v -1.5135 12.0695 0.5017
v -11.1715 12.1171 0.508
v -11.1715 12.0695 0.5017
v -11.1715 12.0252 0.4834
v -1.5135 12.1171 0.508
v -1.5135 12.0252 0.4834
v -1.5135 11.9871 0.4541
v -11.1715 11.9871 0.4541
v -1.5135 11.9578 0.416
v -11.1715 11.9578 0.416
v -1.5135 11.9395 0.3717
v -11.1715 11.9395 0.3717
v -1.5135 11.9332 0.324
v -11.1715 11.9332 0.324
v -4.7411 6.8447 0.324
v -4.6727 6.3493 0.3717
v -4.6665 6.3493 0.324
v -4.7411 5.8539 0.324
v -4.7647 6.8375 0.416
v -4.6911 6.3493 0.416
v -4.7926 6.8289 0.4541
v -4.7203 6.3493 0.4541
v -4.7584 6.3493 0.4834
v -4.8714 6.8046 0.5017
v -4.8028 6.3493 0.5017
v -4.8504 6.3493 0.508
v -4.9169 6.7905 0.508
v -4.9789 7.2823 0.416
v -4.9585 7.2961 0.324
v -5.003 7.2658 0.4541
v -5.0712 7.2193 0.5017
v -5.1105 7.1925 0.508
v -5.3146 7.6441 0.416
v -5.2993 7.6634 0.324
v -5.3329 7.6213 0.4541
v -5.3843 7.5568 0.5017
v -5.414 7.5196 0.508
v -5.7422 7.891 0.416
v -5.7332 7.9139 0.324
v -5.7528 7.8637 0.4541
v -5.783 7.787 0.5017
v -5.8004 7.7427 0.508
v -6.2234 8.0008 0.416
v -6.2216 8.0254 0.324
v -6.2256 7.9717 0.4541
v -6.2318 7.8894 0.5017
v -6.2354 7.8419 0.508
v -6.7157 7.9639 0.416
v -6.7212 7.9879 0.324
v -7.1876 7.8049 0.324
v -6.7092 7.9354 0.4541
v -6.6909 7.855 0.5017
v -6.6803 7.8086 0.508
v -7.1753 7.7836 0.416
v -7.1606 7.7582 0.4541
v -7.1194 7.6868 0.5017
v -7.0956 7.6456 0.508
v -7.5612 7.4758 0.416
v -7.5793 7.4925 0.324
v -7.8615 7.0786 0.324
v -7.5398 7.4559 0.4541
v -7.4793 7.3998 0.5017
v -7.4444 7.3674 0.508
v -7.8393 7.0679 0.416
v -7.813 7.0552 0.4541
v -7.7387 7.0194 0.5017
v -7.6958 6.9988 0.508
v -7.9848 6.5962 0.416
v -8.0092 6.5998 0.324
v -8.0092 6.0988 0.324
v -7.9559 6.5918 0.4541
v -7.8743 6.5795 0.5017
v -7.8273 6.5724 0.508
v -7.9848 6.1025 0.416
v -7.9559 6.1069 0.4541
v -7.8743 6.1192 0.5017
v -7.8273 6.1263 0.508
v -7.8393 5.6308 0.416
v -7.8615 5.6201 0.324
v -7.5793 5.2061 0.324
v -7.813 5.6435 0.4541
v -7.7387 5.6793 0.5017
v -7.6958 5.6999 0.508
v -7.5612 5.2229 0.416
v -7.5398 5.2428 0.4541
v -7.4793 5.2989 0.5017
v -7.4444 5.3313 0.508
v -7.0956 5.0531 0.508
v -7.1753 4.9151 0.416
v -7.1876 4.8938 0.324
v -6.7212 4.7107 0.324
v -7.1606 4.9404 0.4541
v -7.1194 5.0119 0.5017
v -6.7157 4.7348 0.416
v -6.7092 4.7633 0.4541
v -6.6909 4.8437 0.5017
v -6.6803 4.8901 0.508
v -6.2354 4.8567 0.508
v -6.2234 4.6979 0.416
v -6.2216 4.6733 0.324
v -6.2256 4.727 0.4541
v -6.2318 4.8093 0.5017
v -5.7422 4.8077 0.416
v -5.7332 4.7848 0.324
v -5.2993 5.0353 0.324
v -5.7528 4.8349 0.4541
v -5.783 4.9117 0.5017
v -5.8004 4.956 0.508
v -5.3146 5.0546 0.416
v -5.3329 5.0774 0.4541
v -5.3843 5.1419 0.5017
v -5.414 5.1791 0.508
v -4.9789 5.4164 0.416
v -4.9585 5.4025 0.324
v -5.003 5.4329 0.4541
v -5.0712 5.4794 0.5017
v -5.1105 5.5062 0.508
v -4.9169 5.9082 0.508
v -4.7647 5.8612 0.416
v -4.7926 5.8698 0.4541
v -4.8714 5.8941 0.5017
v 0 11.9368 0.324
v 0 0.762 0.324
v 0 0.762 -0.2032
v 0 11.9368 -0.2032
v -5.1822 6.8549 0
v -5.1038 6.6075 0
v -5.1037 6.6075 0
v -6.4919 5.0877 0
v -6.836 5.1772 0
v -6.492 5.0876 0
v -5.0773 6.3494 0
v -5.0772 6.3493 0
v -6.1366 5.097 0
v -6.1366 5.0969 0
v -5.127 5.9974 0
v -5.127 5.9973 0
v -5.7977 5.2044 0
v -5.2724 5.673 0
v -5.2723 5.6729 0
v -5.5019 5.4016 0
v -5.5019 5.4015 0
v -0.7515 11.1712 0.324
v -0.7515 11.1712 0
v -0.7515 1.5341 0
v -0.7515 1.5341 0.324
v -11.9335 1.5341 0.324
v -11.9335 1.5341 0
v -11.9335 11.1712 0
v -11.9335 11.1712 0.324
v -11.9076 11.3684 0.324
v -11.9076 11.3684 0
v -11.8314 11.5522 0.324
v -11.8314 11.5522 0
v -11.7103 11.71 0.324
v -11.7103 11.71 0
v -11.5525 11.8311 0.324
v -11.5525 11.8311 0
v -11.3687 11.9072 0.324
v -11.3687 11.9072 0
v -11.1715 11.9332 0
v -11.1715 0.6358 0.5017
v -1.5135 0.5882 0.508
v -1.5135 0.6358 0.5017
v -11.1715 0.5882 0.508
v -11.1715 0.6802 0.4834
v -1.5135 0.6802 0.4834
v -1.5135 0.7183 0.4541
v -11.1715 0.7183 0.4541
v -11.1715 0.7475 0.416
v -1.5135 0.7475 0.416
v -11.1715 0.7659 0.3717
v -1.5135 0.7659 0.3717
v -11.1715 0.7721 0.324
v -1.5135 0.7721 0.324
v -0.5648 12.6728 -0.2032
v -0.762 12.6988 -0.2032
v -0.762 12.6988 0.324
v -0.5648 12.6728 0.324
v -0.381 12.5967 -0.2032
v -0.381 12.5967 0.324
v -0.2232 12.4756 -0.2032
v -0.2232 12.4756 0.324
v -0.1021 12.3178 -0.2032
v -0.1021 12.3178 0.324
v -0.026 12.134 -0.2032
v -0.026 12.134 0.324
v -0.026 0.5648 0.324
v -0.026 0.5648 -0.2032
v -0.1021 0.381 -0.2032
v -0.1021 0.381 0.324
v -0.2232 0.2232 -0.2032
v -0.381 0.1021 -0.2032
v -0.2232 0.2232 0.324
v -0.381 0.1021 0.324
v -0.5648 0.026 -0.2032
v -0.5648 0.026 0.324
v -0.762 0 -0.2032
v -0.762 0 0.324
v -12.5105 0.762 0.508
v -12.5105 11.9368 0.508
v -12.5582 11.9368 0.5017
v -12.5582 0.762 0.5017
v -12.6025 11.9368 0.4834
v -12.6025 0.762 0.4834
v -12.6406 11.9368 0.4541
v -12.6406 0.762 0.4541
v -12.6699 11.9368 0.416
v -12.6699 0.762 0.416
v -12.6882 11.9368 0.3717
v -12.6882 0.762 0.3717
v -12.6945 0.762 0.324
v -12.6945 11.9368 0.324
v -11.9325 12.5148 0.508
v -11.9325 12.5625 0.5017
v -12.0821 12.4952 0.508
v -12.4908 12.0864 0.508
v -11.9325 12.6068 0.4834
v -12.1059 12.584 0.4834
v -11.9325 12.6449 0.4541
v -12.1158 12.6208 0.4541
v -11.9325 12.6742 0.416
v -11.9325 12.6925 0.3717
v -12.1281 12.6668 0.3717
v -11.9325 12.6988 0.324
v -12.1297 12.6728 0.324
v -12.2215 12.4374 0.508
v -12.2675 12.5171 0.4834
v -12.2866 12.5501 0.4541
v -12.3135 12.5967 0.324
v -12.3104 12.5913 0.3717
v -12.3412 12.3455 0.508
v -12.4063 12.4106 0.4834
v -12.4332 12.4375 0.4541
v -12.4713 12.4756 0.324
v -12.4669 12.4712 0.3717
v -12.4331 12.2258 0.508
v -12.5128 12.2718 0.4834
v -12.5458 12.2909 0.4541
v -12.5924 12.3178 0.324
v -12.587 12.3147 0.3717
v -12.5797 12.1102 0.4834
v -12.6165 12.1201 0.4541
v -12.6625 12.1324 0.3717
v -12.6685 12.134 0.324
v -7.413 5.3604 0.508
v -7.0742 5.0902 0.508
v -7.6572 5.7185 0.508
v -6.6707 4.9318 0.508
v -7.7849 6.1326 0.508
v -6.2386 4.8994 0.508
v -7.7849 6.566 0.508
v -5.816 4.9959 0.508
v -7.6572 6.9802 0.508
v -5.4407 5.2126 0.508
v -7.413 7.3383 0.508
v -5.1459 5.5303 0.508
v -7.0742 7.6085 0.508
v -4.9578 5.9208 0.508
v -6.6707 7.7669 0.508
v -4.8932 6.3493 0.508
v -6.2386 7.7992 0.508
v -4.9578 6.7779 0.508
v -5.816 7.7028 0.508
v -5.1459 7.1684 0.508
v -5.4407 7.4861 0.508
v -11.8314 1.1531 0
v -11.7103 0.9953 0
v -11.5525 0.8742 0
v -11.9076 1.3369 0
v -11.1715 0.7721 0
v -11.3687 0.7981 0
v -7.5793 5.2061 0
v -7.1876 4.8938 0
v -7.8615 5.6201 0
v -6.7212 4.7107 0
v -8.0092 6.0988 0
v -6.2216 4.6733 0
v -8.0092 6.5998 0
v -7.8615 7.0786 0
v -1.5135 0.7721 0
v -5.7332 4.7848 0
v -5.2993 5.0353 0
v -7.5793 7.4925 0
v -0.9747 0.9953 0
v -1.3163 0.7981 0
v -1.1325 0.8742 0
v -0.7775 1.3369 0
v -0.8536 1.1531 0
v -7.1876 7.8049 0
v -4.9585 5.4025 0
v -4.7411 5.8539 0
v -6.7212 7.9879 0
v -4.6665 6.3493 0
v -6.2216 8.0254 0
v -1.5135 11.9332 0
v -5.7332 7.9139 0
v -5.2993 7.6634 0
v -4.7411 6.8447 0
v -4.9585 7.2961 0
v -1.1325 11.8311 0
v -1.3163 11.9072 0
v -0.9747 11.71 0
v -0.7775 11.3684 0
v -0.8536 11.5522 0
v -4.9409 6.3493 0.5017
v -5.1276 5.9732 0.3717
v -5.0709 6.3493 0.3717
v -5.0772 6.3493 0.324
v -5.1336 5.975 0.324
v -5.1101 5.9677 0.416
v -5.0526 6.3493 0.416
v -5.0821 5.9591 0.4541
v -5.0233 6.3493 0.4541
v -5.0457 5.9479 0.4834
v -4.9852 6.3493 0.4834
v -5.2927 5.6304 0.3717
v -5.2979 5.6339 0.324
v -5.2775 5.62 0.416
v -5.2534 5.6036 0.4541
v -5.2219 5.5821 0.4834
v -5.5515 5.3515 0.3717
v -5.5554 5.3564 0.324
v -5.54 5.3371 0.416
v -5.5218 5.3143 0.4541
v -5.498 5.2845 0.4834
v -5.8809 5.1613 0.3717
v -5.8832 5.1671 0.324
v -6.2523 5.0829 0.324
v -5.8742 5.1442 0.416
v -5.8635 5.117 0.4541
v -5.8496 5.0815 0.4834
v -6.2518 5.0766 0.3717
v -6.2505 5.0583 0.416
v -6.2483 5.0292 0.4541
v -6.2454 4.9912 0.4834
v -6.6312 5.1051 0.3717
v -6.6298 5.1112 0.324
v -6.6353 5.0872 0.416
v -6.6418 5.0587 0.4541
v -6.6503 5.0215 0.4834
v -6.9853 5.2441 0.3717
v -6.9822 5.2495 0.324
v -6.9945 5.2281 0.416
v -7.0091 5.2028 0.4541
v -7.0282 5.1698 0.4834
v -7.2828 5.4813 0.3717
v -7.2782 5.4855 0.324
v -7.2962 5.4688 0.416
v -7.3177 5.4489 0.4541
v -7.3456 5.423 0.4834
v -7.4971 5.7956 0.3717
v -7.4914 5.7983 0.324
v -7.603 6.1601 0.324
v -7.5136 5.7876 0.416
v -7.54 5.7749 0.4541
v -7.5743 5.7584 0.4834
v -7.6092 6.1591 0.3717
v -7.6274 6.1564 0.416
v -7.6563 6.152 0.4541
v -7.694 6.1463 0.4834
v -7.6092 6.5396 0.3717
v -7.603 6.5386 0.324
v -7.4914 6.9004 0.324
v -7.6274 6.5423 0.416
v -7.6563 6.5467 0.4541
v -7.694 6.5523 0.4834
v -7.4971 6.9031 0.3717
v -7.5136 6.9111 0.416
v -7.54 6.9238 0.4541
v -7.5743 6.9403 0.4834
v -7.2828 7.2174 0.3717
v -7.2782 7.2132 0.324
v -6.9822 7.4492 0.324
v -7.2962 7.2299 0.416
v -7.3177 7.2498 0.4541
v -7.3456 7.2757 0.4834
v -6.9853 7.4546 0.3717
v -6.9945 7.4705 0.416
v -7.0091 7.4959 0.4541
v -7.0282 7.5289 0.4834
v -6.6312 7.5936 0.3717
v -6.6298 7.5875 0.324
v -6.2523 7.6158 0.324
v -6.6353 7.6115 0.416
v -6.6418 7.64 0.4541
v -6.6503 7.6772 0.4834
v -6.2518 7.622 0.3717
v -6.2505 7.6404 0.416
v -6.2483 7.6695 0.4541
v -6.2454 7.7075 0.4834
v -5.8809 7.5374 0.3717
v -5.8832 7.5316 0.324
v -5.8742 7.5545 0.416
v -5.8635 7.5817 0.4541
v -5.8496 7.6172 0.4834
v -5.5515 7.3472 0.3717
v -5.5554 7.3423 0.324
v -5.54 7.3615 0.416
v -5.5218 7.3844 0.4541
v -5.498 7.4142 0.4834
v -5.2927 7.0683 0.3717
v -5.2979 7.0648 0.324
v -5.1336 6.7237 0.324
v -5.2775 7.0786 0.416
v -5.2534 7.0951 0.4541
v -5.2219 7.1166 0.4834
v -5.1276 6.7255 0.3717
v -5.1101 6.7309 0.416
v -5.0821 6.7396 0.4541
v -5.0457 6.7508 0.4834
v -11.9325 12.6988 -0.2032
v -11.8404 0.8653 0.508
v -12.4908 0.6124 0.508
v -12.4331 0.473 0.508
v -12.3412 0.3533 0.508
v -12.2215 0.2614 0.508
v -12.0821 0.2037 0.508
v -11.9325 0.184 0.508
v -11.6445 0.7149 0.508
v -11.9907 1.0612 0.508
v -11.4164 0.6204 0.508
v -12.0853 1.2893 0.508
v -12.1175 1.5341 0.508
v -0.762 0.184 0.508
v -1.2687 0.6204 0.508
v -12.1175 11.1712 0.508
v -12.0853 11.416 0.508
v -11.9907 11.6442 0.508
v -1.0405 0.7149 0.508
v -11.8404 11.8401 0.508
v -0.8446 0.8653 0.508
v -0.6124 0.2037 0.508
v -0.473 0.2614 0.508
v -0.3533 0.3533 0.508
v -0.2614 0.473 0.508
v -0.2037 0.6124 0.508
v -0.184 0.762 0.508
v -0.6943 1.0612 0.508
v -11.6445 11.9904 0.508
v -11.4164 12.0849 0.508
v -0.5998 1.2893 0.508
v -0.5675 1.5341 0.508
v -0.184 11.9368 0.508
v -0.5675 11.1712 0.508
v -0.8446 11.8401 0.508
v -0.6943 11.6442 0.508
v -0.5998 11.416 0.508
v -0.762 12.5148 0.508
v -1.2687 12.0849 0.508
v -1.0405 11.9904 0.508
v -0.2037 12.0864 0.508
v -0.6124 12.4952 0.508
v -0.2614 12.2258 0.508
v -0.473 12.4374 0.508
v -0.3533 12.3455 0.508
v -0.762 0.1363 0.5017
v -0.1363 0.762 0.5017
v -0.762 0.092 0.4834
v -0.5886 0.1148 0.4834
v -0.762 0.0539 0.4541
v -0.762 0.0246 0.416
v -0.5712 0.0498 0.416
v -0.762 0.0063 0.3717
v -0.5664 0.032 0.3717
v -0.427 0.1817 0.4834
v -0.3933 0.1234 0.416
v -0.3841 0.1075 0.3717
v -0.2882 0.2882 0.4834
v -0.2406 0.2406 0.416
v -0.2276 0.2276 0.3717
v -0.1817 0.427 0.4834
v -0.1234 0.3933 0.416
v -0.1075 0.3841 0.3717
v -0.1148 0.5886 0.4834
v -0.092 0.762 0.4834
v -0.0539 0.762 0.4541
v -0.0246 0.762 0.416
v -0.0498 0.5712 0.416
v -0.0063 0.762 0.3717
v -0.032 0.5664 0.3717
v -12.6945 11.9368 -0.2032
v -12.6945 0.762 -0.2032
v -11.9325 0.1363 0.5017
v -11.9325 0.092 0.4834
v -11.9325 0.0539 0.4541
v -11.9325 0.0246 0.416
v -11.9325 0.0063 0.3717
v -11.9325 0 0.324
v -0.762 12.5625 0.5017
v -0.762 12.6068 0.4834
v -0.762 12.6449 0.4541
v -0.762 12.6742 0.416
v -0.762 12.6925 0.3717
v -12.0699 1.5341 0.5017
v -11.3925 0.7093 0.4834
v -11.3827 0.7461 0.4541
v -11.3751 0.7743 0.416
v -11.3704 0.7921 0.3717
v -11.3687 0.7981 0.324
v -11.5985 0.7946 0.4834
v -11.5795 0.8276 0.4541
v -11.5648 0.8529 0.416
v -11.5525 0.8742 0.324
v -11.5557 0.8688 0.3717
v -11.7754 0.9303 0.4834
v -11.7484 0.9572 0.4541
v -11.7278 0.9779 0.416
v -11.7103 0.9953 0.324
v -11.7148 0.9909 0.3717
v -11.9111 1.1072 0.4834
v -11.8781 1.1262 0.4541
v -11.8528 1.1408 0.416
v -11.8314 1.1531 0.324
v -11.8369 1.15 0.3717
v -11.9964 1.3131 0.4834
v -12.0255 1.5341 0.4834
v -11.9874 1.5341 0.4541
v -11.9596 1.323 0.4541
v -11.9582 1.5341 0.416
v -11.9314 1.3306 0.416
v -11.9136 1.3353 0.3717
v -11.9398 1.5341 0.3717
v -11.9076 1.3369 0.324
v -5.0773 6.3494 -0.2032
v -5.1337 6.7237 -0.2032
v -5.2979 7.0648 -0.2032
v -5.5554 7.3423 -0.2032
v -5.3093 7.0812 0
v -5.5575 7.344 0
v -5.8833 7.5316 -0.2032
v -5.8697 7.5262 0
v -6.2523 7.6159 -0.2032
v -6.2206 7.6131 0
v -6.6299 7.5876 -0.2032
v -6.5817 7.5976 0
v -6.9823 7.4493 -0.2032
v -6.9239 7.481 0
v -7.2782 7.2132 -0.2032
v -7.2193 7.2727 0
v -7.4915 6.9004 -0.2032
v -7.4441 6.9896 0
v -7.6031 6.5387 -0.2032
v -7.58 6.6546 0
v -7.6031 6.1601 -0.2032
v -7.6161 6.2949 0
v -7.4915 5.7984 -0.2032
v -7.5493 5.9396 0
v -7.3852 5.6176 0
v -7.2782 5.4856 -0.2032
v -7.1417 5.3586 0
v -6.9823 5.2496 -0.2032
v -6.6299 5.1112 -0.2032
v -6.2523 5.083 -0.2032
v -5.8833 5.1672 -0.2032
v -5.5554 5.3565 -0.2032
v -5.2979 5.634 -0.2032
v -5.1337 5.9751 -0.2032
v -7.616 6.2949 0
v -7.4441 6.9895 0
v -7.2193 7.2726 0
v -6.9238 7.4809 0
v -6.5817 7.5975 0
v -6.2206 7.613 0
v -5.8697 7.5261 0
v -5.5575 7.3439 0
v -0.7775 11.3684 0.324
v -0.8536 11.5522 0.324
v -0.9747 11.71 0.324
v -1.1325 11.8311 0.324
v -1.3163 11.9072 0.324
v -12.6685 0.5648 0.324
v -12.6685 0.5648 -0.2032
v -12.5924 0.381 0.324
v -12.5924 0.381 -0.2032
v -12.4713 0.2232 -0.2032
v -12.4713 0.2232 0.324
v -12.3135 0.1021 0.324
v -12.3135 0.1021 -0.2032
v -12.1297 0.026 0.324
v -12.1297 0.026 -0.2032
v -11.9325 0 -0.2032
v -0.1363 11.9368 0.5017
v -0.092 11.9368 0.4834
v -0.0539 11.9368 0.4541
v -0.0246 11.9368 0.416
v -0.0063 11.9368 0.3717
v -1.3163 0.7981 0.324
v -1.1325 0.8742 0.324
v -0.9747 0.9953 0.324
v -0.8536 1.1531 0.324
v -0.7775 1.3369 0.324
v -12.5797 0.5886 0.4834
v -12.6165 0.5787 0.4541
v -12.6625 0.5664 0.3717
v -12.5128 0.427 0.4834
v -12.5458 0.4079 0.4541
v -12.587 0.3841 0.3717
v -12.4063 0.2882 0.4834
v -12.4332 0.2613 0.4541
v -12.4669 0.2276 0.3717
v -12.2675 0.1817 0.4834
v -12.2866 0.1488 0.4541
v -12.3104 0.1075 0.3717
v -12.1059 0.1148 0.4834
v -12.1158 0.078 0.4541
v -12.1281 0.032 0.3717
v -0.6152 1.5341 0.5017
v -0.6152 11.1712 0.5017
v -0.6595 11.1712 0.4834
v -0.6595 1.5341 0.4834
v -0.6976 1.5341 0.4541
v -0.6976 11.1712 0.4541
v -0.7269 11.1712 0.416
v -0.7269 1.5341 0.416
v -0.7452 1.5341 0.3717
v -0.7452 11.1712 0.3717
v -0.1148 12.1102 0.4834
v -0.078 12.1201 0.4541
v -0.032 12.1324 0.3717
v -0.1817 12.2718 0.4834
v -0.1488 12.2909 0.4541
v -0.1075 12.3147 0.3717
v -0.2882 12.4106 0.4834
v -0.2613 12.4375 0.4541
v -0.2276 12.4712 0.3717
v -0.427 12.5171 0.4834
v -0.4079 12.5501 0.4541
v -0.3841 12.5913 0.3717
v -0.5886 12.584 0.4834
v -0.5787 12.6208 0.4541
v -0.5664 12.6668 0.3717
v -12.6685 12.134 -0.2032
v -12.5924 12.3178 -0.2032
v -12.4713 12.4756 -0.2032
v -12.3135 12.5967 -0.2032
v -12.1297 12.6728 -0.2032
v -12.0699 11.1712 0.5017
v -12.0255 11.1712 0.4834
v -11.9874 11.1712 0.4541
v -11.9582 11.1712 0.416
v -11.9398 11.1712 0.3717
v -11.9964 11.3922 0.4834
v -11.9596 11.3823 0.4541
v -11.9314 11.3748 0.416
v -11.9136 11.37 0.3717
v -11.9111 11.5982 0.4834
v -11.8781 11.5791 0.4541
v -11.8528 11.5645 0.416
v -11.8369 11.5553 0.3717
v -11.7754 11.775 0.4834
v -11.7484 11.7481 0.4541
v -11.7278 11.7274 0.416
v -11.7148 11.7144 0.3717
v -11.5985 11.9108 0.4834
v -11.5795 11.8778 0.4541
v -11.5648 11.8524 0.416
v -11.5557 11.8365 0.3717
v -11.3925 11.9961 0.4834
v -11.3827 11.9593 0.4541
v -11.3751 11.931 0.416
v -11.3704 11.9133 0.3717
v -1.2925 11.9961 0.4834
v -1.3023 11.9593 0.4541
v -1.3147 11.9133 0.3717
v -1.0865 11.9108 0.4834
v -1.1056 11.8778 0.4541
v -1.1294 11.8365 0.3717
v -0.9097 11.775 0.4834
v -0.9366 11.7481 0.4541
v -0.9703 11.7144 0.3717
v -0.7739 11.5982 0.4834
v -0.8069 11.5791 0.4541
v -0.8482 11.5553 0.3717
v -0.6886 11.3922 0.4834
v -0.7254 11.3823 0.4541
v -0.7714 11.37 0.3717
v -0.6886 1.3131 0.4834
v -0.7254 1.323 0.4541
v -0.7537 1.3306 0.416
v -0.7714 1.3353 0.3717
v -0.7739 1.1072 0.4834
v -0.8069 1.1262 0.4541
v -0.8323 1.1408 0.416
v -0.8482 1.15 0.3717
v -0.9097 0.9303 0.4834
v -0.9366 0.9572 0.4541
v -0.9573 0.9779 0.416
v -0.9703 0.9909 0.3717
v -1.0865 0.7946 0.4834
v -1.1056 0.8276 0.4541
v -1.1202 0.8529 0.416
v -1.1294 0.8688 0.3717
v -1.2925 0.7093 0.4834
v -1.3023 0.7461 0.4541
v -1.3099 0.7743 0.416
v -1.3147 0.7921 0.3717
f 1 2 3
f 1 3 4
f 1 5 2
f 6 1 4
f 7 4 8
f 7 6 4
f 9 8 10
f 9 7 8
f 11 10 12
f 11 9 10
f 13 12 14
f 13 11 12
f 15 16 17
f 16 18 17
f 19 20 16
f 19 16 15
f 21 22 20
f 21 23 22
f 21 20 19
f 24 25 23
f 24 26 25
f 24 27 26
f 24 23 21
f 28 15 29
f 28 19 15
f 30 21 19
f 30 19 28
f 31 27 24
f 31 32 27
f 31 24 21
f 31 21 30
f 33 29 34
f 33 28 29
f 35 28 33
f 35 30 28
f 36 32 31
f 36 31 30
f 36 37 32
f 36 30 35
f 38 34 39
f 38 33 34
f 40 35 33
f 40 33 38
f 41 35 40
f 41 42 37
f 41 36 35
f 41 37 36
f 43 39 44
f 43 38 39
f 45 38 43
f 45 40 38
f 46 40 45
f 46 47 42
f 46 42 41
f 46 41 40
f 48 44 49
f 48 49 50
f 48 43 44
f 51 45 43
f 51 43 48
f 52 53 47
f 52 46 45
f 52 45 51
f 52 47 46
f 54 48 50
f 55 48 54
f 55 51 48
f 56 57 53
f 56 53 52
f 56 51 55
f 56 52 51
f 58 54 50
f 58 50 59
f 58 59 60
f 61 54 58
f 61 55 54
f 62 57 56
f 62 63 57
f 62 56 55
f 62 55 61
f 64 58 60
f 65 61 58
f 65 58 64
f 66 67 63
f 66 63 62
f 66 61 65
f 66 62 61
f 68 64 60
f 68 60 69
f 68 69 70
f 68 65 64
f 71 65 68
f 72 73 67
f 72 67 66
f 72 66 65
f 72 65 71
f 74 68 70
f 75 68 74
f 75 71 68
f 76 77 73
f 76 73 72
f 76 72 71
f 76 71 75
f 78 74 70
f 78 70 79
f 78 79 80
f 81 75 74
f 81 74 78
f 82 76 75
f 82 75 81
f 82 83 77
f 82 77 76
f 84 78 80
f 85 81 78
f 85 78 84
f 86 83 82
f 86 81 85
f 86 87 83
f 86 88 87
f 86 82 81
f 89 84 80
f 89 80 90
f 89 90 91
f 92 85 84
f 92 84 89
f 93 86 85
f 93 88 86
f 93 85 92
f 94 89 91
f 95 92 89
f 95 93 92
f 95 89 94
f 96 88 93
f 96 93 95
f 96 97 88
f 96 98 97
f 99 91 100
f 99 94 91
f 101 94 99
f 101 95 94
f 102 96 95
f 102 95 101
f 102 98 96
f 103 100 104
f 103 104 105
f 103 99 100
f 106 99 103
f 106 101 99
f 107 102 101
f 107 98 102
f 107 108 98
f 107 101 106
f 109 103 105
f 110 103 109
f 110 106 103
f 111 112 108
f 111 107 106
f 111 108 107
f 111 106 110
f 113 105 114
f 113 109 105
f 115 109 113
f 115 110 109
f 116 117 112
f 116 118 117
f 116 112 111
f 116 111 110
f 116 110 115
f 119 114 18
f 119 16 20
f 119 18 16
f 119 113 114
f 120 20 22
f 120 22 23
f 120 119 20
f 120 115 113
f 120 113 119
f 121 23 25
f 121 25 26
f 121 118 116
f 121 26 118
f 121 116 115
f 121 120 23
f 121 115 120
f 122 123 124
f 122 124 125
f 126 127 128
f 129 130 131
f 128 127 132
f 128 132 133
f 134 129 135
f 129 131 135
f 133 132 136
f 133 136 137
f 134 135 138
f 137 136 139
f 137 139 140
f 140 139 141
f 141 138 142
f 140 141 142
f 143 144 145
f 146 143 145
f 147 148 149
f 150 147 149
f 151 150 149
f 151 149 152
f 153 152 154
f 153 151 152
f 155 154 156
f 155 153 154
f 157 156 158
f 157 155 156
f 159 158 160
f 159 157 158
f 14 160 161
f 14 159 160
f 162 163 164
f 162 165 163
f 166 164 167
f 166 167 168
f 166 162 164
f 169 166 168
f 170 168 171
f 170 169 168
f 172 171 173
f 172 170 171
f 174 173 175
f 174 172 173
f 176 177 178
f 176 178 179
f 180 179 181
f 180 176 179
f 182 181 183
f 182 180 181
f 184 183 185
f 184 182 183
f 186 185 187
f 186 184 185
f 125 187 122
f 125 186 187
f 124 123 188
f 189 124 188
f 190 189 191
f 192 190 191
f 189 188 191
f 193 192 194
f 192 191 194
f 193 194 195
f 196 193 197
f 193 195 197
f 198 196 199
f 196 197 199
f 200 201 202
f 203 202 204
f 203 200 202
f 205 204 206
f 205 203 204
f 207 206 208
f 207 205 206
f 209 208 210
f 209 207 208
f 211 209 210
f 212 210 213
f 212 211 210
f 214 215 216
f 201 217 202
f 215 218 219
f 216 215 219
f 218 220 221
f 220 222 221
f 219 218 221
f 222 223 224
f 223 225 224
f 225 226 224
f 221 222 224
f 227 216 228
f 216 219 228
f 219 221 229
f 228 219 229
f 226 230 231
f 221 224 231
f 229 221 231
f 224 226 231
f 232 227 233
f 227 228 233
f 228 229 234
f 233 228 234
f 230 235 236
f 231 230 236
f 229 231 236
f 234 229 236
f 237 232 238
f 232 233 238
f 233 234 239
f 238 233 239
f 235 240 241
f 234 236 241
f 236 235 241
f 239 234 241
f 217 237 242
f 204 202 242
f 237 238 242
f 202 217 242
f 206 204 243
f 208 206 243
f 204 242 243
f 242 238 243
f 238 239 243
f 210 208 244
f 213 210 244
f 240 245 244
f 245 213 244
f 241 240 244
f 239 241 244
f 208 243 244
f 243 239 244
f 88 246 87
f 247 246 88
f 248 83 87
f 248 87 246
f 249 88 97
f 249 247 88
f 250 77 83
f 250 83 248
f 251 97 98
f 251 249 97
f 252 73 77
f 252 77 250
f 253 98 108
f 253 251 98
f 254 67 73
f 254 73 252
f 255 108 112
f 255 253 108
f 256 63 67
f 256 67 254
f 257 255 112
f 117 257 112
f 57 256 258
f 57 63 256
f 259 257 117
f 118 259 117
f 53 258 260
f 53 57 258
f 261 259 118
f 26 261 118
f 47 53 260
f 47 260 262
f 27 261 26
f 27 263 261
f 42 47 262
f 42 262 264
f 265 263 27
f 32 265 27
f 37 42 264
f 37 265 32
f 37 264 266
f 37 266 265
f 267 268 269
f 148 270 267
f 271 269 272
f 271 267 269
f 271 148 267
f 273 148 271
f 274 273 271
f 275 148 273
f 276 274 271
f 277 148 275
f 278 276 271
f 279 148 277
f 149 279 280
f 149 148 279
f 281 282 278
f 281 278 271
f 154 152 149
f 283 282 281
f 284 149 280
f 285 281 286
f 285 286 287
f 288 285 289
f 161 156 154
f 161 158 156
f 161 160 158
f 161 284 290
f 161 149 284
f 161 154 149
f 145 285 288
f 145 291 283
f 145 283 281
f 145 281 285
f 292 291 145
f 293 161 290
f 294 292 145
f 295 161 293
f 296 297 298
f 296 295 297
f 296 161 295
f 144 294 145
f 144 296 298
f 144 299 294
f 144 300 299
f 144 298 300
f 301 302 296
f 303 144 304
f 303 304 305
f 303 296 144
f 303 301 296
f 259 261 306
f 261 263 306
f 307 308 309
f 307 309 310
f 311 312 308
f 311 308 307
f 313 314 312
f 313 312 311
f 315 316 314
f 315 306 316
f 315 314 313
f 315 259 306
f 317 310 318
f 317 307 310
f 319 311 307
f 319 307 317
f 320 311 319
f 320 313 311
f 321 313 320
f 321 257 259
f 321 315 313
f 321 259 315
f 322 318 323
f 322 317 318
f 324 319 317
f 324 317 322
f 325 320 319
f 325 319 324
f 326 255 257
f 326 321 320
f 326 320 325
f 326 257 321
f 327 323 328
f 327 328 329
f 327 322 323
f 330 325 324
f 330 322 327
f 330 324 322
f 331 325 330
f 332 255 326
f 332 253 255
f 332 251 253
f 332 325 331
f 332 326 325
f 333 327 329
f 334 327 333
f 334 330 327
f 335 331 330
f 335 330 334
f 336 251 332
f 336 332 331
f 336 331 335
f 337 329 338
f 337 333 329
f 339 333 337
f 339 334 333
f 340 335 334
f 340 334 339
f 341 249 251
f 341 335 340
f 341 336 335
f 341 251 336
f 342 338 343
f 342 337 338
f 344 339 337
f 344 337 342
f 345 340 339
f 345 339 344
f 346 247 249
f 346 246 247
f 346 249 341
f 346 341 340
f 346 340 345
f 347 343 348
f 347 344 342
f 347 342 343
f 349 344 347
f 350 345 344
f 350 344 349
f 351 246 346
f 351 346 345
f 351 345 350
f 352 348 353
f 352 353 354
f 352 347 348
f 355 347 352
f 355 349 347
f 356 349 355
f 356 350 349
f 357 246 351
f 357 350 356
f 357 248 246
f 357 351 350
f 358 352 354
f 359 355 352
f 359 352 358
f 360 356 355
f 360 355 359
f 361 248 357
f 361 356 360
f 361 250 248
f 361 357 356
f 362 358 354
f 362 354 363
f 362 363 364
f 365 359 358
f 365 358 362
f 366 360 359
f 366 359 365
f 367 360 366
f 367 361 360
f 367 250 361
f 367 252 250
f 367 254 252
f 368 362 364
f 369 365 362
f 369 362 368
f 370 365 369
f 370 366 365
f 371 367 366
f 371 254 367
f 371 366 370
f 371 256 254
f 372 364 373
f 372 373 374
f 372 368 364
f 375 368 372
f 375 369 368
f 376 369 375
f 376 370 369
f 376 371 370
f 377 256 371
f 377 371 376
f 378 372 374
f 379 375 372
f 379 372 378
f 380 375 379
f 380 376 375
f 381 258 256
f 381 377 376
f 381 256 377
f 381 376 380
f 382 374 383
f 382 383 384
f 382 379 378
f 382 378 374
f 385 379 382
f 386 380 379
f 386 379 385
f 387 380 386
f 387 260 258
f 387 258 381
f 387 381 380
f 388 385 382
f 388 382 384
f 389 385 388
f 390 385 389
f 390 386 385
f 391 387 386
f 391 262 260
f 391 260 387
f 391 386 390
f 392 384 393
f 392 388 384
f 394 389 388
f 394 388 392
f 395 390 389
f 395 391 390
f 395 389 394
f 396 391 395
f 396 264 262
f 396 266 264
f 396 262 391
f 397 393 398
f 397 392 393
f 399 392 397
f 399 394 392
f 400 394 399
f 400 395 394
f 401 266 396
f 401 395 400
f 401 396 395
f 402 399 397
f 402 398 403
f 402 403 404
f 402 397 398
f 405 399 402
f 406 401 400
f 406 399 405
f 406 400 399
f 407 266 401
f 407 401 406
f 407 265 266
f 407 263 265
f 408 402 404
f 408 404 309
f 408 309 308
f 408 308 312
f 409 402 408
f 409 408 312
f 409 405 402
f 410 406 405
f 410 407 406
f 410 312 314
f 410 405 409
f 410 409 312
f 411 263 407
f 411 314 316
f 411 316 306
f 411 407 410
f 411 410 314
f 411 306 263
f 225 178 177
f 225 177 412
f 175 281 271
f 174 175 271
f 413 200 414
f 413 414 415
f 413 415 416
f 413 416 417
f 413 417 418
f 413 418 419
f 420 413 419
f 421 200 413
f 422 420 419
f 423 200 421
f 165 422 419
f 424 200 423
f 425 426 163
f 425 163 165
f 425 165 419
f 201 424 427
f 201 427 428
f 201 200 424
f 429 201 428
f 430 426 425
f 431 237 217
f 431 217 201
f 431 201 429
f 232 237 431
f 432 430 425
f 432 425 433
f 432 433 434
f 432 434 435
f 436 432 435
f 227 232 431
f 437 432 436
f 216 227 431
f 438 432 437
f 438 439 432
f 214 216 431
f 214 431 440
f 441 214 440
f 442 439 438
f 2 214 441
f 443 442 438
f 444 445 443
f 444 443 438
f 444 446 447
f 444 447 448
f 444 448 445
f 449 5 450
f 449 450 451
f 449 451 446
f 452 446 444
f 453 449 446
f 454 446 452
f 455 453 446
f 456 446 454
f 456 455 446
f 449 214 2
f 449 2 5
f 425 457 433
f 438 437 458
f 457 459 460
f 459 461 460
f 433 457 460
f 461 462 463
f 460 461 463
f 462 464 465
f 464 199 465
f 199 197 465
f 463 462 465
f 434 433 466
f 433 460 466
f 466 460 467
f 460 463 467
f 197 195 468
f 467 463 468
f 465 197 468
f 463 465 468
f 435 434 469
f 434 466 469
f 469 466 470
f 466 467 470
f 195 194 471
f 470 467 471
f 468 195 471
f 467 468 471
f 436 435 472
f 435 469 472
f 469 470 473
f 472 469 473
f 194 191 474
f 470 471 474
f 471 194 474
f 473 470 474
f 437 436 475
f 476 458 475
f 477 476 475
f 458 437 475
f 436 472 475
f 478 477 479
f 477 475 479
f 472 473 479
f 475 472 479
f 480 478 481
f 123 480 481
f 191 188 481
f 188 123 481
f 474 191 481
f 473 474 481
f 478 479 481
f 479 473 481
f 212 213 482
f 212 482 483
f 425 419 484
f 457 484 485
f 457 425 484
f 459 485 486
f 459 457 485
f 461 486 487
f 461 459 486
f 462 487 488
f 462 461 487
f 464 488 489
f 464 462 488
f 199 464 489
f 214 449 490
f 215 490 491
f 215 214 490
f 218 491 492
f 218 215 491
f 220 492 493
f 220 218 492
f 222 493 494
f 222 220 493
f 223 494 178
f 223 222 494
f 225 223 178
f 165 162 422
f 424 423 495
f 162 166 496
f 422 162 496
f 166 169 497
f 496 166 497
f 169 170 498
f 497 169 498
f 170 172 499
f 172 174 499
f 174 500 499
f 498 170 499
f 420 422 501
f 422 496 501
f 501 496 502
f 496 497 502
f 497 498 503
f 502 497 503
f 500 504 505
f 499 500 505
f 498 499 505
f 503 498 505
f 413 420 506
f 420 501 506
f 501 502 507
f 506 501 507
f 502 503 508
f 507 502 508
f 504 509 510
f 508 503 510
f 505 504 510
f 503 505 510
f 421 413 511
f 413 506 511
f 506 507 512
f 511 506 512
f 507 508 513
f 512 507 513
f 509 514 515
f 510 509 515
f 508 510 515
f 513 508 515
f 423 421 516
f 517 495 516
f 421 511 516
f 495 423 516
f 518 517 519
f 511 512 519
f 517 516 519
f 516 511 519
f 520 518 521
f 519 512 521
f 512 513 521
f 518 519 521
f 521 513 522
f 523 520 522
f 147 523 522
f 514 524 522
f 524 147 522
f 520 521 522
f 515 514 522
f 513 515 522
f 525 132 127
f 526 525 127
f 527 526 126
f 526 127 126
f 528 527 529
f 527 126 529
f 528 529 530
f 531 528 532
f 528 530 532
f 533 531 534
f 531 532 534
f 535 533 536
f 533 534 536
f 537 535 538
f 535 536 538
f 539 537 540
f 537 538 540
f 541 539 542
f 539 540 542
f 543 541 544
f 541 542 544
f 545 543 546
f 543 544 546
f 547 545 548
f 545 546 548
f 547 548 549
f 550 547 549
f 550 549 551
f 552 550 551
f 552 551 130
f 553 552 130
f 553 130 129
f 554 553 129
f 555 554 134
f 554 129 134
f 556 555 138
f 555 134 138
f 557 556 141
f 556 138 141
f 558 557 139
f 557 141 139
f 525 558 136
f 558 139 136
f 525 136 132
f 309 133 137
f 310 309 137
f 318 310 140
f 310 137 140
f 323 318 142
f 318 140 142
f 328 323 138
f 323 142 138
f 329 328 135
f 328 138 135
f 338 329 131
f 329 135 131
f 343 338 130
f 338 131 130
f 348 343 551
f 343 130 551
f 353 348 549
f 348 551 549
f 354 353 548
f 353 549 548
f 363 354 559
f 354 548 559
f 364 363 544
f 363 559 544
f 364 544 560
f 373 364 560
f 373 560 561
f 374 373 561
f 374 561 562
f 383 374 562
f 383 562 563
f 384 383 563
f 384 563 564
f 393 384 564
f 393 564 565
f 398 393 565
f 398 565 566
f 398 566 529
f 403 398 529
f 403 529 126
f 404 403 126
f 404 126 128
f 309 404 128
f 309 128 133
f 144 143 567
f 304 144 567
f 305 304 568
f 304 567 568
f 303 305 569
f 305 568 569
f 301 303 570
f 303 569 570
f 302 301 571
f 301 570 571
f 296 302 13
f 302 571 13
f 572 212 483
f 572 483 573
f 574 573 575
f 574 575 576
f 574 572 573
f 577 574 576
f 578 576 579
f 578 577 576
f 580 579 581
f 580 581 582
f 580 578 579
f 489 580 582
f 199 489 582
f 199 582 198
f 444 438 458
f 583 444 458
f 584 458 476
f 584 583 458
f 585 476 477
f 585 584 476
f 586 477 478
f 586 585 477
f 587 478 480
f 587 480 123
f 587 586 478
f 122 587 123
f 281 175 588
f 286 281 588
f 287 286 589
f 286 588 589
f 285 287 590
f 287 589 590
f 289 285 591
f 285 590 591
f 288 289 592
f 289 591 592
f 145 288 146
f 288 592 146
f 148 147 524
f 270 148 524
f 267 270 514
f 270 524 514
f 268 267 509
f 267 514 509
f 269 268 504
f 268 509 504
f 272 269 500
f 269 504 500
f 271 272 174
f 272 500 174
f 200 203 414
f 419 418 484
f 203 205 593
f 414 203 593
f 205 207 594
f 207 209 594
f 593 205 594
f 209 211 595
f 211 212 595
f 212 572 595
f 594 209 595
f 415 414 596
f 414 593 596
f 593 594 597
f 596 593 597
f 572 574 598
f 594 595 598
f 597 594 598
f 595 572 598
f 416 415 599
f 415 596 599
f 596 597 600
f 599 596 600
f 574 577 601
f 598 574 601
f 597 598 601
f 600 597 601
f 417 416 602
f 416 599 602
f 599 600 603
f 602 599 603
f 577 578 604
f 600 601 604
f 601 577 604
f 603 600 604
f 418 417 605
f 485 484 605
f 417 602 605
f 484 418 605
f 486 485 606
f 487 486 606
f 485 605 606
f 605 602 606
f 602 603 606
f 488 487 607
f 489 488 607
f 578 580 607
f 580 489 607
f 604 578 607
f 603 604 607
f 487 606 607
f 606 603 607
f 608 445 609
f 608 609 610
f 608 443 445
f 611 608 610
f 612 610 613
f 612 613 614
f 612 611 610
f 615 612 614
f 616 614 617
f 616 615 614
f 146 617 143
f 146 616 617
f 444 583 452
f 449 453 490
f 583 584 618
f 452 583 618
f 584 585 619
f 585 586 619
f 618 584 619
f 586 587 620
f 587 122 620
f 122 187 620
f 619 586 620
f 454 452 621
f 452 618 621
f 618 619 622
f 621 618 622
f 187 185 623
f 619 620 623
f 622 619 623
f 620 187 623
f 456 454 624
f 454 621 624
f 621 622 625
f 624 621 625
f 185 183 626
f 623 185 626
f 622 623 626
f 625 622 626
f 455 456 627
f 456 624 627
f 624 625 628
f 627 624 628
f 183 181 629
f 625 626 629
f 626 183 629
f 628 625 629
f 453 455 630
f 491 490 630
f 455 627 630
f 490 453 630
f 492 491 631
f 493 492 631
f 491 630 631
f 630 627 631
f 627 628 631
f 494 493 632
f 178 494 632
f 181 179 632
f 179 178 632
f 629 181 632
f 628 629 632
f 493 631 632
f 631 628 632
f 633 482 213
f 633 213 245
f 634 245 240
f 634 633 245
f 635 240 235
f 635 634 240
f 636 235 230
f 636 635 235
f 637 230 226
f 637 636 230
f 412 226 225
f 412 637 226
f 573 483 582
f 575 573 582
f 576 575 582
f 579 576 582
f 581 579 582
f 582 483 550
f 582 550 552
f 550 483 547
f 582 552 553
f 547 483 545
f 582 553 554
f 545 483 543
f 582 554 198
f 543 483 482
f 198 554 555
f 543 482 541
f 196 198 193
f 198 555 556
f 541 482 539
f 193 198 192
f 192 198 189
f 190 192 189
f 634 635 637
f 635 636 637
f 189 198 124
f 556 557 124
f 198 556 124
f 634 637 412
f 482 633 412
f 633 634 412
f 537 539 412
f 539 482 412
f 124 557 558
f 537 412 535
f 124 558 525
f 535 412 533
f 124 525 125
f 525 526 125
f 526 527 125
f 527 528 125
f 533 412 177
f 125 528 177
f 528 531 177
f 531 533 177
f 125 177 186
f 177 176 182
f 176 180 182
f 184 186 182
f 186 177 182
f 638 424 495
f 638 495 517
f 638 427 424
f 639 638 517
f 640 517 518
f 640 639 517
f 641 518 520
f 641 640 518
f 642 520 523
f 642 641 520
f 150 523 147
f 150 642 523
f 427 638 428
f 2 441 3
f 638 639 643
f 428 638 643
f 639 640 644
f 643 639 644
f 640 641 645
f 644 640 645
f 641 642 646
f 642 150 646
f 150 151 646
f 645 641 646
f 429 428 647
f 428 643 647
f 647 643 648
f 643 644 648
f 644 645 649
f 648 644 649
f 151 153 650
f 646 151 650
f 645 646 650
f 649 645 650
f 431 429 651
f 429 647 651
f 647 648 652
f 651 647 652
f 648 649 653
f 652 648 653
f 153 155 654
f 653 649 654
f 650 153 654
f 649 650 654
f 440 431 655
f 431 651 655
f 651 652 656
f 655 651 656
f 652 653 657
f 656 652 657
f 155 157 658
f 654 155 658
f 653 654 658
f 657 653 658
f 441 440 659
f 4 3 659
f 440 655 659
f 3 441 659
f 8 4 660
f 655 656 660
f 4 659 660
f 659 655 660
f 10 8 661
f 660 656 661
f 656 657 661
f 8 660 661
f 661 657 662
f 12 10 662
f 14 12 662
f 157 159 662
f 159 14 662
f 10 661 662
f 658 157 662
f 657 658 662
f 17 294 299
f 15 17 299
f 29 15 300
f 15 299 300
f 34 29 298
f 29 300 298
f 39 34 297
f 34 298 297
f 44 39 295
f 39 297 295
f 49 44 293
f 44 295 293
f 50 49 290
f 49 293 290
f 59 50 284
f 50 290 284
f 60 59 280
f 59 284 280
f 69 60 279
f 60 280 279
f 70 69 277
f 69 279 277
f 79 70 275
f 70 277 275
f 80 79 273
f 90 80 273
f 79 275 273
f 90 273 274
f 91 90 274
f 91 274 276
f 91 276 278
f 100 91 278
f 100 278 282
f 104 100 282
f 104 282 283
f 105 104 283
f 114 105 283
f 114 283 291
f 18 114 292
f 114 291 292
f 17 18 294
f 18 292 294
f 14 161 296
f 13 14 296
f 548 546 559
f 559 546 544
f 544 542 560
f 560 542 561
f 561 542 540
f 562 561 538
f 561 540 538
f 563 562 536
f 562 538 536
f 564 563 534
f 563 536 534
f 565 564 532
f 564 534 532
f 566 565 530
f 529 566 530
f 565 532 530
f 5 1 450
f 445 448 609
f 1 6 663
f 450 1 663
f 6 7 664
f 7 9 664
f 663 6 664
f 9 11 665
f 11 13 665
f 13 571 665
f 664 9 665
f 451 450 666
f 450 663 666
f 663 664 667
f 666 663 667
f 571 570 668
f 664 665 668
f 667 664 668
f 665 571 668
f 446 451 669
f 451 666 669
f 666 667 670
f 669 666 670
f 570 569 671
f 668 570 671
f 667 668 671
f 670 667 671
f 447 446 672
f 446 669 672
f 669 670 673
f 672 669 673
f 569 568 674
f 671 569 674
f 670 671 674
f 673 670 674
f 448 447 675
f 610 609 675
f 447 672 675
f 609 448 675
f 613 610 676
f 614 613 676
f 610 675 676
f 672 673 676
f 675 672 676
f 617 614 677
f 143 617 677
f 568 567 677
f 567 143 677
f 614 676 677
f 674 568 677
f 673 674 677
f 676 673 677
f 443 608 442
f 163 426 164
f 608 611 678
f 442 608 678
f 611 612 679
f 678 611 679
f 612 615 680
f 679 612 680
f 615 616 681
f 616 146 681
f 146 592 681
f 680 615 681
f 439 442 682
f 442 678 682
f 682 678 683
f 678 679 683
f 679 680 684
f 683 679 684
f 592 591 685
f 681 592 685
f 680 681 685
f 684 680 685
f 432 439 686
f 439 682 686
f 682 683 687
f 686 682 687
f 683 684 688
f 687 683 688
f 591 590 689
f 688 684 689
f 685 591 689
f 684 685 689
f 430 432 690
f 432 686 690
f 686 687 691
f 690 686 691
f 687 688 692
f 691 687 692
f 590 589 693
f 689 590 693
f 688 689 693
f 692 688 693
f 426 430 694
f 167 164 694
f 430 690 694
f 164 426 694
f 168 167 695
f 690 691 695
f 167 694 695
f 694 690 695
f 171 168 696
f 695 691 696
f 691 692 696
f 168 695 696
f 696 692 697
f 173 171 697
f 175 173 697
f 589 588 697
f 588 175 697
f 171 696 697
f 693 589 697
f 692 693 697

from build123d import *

# Parameters (mm, degrees)
F1_DEPTH = 0.508
F2_DEPTH = 0.2032
F3_R     = 0.762
F5_R     = 1.6807405663
F6_DEPTH = 0.508
F7_D     = 2.54
F7_DEPTH = 0.509
F8_D     = 2.54
F8_DEPTH = 0.2042
F9_R     = 0.1839630735


with BuildPart() as f1:
    # F0 (on Top) → F1 (new body)
    with BuildSketch(Plane.XY):
        Polygon((-12.694504112, 12.6988124102), (-12.694504112, 6.3494062051), (-11.9335213676, 6.3494062051), (-11.9335213676, 11.9331842288), (-6.347252056, 11.9331842288), (-6.347252056, 12.6988124102), align=None)
        Polygon((-0.7515071775, 6.3494062051), (0, 6.3494062051), (0, 12.6988124102), (-6.347252056, 12.6988124102), (-6.347252056, 11.9331842288), (-0.7515071775, 11.9331842288), align=None)
        Polygon((-6.347252056, 0), (0, 0), (0, 6.3494062051), (-0.7515071775, 6.3494062051), (-0.7515071775, 0.7721490692), (-6.347252056, 0.7721490692), align=None)
        Polygon((-12.694504112, 0), (-6.347252056, 0), (-6.347252056, 0.7721490692), (-11.9335213676, 0.7721490692), (-11.9335213676, 6.3494062051), (-12.694504112, 6.3494062051), align=None)
    extrude(amount=F1_DEPTH)

    # F0 (on Top) → F2 (join)
    with BuildSketch(Plane.XY):
        Polygon((-11.9335213676, 0.7721490692), (-6.347252056, 0.7721490692), (-0.7515071775, 0.7721490692), (-0.7515071775, 6.3494062051), (-0.7515071775, 11.9331842288), (-6.347252056, 11.9331842288), (-11.9335213676, 11.9331842288), (-11.9335213676, 6.3494062051), align=None)
        Polygon((-12.694504112, 12.6988124102), (-12.694504112, 6.3494062051), (-11.9335213676, 6.3494062051), (-11.9335213676, 11.9331842288), (-6.347252056, 11.9331842288), (-6.347252056, 12.6988124102), align=None)
        Polygon((-12.694504112, 0), (-6.347252056, 0), (-6.347252056, 0.7721490692), (-11.9335213676, 0.7721490692), (-11.9335213676, 6.3494062051), (-12.694504112, 6.3494062051), align=None)
        Polygon((-6.347252056, 0), (0, 0), (0, 6.3494062051), (-0.7515071775, 6.3494062051), (-0.7515071775, 0.7721490692), (-6.347252056, 0.7721490692), align=None)
        Polygon((-0.7515071775, 6.3494062051), (0, 6.3494062051), (0, 12.6988124102), (-6.347252056, 12.6988124102), (-6.347252056, 11.9331842288), (-0.7515071775, 11.9331842288), align=None)
    extrude(amount=-F2_DEPTH)

    # F3
    f3_edges = [f1.edges().sort_by_distance(p)[0] for p in [
        (0, 0, 0.1524),
        (0, 12.698812, 0.1524),
        (-12.694504, 12.698812, 0.1524),
        (-12.694504, 0, 0.1524),
        (-11.933521, 11.933184, 0.254),
        (-11.933521, 0.772149, 0.254),
        (-0.751507, 11.933184, 0.254),
        (-0.751507, 0.772149, 0.254),
    ]]
    fillet(f3_edges, radius=F3_R)

    # F5 (on offset) → F6 (join)
    with BuildSketch(Plane.XY):
        with Locations((-6.3472064212, 6.3493414782)):
            Circle(F5_R)
    extrude(amount=F6_DEPTH)

    # F7 (through all, one way)
    with BuildSketch(Plane(origin=(0, 0, 0), x_dir=(1, 0, 0), z_dir=(0, 0, -1))):
        with Locations((-6.3472064212, -6.3493414782)):
            Circle(F7_D / 2)
    extrude(amount=-F7_DEPTH, mode=Mode.SUBTRACT)

    # F8 (through all, one way)
    with BuildSketch(Plane.XY):
        with Locations((-6.347252056, 6.3494062051)):
            Circle(F8_D / 2)
    extrude(amount=-F8_DEPTH, mode=Mode.SUBTRACT)

    # F9
    f9_edges = [f1.edges().sort_by_distance(p)[0] for p in [
        (-8.027947, 6.349341, 0.508),
        (0, 6.349406, 0.508),
        (-0.751507, 6.352667, 0.508),
        (-12.694504, 6.349406, 0.508),
        (-12.471319, 12.475628, 0.508),
        (-12.471319, 0.223185, 0.508),
        (-6.347252, 12.698812, 0.508),
        (-6.347252, 0, 0.508),
        (-0.223185, 12.475628, 0.508),
        (-0.223185, 0.223185, 0.508),
        (-6.342514, 11.933184, 0.508),
        (-11.710337, 11.71, 0.508),
        (-0.974692, 11.71, 0.508),
        (-11.933521, 6.352667, 0.508),
        (-11.710337, 0.995334, 0.508),
        (-0.974692, 0.995334, 0.508),
        (-6.342514, 0.772149, 0.508),
        (-7.617206, 6.349341, 0.508),
    ]]
    fillet(f9_edges, radius=F9_R)


solid = f1.part
